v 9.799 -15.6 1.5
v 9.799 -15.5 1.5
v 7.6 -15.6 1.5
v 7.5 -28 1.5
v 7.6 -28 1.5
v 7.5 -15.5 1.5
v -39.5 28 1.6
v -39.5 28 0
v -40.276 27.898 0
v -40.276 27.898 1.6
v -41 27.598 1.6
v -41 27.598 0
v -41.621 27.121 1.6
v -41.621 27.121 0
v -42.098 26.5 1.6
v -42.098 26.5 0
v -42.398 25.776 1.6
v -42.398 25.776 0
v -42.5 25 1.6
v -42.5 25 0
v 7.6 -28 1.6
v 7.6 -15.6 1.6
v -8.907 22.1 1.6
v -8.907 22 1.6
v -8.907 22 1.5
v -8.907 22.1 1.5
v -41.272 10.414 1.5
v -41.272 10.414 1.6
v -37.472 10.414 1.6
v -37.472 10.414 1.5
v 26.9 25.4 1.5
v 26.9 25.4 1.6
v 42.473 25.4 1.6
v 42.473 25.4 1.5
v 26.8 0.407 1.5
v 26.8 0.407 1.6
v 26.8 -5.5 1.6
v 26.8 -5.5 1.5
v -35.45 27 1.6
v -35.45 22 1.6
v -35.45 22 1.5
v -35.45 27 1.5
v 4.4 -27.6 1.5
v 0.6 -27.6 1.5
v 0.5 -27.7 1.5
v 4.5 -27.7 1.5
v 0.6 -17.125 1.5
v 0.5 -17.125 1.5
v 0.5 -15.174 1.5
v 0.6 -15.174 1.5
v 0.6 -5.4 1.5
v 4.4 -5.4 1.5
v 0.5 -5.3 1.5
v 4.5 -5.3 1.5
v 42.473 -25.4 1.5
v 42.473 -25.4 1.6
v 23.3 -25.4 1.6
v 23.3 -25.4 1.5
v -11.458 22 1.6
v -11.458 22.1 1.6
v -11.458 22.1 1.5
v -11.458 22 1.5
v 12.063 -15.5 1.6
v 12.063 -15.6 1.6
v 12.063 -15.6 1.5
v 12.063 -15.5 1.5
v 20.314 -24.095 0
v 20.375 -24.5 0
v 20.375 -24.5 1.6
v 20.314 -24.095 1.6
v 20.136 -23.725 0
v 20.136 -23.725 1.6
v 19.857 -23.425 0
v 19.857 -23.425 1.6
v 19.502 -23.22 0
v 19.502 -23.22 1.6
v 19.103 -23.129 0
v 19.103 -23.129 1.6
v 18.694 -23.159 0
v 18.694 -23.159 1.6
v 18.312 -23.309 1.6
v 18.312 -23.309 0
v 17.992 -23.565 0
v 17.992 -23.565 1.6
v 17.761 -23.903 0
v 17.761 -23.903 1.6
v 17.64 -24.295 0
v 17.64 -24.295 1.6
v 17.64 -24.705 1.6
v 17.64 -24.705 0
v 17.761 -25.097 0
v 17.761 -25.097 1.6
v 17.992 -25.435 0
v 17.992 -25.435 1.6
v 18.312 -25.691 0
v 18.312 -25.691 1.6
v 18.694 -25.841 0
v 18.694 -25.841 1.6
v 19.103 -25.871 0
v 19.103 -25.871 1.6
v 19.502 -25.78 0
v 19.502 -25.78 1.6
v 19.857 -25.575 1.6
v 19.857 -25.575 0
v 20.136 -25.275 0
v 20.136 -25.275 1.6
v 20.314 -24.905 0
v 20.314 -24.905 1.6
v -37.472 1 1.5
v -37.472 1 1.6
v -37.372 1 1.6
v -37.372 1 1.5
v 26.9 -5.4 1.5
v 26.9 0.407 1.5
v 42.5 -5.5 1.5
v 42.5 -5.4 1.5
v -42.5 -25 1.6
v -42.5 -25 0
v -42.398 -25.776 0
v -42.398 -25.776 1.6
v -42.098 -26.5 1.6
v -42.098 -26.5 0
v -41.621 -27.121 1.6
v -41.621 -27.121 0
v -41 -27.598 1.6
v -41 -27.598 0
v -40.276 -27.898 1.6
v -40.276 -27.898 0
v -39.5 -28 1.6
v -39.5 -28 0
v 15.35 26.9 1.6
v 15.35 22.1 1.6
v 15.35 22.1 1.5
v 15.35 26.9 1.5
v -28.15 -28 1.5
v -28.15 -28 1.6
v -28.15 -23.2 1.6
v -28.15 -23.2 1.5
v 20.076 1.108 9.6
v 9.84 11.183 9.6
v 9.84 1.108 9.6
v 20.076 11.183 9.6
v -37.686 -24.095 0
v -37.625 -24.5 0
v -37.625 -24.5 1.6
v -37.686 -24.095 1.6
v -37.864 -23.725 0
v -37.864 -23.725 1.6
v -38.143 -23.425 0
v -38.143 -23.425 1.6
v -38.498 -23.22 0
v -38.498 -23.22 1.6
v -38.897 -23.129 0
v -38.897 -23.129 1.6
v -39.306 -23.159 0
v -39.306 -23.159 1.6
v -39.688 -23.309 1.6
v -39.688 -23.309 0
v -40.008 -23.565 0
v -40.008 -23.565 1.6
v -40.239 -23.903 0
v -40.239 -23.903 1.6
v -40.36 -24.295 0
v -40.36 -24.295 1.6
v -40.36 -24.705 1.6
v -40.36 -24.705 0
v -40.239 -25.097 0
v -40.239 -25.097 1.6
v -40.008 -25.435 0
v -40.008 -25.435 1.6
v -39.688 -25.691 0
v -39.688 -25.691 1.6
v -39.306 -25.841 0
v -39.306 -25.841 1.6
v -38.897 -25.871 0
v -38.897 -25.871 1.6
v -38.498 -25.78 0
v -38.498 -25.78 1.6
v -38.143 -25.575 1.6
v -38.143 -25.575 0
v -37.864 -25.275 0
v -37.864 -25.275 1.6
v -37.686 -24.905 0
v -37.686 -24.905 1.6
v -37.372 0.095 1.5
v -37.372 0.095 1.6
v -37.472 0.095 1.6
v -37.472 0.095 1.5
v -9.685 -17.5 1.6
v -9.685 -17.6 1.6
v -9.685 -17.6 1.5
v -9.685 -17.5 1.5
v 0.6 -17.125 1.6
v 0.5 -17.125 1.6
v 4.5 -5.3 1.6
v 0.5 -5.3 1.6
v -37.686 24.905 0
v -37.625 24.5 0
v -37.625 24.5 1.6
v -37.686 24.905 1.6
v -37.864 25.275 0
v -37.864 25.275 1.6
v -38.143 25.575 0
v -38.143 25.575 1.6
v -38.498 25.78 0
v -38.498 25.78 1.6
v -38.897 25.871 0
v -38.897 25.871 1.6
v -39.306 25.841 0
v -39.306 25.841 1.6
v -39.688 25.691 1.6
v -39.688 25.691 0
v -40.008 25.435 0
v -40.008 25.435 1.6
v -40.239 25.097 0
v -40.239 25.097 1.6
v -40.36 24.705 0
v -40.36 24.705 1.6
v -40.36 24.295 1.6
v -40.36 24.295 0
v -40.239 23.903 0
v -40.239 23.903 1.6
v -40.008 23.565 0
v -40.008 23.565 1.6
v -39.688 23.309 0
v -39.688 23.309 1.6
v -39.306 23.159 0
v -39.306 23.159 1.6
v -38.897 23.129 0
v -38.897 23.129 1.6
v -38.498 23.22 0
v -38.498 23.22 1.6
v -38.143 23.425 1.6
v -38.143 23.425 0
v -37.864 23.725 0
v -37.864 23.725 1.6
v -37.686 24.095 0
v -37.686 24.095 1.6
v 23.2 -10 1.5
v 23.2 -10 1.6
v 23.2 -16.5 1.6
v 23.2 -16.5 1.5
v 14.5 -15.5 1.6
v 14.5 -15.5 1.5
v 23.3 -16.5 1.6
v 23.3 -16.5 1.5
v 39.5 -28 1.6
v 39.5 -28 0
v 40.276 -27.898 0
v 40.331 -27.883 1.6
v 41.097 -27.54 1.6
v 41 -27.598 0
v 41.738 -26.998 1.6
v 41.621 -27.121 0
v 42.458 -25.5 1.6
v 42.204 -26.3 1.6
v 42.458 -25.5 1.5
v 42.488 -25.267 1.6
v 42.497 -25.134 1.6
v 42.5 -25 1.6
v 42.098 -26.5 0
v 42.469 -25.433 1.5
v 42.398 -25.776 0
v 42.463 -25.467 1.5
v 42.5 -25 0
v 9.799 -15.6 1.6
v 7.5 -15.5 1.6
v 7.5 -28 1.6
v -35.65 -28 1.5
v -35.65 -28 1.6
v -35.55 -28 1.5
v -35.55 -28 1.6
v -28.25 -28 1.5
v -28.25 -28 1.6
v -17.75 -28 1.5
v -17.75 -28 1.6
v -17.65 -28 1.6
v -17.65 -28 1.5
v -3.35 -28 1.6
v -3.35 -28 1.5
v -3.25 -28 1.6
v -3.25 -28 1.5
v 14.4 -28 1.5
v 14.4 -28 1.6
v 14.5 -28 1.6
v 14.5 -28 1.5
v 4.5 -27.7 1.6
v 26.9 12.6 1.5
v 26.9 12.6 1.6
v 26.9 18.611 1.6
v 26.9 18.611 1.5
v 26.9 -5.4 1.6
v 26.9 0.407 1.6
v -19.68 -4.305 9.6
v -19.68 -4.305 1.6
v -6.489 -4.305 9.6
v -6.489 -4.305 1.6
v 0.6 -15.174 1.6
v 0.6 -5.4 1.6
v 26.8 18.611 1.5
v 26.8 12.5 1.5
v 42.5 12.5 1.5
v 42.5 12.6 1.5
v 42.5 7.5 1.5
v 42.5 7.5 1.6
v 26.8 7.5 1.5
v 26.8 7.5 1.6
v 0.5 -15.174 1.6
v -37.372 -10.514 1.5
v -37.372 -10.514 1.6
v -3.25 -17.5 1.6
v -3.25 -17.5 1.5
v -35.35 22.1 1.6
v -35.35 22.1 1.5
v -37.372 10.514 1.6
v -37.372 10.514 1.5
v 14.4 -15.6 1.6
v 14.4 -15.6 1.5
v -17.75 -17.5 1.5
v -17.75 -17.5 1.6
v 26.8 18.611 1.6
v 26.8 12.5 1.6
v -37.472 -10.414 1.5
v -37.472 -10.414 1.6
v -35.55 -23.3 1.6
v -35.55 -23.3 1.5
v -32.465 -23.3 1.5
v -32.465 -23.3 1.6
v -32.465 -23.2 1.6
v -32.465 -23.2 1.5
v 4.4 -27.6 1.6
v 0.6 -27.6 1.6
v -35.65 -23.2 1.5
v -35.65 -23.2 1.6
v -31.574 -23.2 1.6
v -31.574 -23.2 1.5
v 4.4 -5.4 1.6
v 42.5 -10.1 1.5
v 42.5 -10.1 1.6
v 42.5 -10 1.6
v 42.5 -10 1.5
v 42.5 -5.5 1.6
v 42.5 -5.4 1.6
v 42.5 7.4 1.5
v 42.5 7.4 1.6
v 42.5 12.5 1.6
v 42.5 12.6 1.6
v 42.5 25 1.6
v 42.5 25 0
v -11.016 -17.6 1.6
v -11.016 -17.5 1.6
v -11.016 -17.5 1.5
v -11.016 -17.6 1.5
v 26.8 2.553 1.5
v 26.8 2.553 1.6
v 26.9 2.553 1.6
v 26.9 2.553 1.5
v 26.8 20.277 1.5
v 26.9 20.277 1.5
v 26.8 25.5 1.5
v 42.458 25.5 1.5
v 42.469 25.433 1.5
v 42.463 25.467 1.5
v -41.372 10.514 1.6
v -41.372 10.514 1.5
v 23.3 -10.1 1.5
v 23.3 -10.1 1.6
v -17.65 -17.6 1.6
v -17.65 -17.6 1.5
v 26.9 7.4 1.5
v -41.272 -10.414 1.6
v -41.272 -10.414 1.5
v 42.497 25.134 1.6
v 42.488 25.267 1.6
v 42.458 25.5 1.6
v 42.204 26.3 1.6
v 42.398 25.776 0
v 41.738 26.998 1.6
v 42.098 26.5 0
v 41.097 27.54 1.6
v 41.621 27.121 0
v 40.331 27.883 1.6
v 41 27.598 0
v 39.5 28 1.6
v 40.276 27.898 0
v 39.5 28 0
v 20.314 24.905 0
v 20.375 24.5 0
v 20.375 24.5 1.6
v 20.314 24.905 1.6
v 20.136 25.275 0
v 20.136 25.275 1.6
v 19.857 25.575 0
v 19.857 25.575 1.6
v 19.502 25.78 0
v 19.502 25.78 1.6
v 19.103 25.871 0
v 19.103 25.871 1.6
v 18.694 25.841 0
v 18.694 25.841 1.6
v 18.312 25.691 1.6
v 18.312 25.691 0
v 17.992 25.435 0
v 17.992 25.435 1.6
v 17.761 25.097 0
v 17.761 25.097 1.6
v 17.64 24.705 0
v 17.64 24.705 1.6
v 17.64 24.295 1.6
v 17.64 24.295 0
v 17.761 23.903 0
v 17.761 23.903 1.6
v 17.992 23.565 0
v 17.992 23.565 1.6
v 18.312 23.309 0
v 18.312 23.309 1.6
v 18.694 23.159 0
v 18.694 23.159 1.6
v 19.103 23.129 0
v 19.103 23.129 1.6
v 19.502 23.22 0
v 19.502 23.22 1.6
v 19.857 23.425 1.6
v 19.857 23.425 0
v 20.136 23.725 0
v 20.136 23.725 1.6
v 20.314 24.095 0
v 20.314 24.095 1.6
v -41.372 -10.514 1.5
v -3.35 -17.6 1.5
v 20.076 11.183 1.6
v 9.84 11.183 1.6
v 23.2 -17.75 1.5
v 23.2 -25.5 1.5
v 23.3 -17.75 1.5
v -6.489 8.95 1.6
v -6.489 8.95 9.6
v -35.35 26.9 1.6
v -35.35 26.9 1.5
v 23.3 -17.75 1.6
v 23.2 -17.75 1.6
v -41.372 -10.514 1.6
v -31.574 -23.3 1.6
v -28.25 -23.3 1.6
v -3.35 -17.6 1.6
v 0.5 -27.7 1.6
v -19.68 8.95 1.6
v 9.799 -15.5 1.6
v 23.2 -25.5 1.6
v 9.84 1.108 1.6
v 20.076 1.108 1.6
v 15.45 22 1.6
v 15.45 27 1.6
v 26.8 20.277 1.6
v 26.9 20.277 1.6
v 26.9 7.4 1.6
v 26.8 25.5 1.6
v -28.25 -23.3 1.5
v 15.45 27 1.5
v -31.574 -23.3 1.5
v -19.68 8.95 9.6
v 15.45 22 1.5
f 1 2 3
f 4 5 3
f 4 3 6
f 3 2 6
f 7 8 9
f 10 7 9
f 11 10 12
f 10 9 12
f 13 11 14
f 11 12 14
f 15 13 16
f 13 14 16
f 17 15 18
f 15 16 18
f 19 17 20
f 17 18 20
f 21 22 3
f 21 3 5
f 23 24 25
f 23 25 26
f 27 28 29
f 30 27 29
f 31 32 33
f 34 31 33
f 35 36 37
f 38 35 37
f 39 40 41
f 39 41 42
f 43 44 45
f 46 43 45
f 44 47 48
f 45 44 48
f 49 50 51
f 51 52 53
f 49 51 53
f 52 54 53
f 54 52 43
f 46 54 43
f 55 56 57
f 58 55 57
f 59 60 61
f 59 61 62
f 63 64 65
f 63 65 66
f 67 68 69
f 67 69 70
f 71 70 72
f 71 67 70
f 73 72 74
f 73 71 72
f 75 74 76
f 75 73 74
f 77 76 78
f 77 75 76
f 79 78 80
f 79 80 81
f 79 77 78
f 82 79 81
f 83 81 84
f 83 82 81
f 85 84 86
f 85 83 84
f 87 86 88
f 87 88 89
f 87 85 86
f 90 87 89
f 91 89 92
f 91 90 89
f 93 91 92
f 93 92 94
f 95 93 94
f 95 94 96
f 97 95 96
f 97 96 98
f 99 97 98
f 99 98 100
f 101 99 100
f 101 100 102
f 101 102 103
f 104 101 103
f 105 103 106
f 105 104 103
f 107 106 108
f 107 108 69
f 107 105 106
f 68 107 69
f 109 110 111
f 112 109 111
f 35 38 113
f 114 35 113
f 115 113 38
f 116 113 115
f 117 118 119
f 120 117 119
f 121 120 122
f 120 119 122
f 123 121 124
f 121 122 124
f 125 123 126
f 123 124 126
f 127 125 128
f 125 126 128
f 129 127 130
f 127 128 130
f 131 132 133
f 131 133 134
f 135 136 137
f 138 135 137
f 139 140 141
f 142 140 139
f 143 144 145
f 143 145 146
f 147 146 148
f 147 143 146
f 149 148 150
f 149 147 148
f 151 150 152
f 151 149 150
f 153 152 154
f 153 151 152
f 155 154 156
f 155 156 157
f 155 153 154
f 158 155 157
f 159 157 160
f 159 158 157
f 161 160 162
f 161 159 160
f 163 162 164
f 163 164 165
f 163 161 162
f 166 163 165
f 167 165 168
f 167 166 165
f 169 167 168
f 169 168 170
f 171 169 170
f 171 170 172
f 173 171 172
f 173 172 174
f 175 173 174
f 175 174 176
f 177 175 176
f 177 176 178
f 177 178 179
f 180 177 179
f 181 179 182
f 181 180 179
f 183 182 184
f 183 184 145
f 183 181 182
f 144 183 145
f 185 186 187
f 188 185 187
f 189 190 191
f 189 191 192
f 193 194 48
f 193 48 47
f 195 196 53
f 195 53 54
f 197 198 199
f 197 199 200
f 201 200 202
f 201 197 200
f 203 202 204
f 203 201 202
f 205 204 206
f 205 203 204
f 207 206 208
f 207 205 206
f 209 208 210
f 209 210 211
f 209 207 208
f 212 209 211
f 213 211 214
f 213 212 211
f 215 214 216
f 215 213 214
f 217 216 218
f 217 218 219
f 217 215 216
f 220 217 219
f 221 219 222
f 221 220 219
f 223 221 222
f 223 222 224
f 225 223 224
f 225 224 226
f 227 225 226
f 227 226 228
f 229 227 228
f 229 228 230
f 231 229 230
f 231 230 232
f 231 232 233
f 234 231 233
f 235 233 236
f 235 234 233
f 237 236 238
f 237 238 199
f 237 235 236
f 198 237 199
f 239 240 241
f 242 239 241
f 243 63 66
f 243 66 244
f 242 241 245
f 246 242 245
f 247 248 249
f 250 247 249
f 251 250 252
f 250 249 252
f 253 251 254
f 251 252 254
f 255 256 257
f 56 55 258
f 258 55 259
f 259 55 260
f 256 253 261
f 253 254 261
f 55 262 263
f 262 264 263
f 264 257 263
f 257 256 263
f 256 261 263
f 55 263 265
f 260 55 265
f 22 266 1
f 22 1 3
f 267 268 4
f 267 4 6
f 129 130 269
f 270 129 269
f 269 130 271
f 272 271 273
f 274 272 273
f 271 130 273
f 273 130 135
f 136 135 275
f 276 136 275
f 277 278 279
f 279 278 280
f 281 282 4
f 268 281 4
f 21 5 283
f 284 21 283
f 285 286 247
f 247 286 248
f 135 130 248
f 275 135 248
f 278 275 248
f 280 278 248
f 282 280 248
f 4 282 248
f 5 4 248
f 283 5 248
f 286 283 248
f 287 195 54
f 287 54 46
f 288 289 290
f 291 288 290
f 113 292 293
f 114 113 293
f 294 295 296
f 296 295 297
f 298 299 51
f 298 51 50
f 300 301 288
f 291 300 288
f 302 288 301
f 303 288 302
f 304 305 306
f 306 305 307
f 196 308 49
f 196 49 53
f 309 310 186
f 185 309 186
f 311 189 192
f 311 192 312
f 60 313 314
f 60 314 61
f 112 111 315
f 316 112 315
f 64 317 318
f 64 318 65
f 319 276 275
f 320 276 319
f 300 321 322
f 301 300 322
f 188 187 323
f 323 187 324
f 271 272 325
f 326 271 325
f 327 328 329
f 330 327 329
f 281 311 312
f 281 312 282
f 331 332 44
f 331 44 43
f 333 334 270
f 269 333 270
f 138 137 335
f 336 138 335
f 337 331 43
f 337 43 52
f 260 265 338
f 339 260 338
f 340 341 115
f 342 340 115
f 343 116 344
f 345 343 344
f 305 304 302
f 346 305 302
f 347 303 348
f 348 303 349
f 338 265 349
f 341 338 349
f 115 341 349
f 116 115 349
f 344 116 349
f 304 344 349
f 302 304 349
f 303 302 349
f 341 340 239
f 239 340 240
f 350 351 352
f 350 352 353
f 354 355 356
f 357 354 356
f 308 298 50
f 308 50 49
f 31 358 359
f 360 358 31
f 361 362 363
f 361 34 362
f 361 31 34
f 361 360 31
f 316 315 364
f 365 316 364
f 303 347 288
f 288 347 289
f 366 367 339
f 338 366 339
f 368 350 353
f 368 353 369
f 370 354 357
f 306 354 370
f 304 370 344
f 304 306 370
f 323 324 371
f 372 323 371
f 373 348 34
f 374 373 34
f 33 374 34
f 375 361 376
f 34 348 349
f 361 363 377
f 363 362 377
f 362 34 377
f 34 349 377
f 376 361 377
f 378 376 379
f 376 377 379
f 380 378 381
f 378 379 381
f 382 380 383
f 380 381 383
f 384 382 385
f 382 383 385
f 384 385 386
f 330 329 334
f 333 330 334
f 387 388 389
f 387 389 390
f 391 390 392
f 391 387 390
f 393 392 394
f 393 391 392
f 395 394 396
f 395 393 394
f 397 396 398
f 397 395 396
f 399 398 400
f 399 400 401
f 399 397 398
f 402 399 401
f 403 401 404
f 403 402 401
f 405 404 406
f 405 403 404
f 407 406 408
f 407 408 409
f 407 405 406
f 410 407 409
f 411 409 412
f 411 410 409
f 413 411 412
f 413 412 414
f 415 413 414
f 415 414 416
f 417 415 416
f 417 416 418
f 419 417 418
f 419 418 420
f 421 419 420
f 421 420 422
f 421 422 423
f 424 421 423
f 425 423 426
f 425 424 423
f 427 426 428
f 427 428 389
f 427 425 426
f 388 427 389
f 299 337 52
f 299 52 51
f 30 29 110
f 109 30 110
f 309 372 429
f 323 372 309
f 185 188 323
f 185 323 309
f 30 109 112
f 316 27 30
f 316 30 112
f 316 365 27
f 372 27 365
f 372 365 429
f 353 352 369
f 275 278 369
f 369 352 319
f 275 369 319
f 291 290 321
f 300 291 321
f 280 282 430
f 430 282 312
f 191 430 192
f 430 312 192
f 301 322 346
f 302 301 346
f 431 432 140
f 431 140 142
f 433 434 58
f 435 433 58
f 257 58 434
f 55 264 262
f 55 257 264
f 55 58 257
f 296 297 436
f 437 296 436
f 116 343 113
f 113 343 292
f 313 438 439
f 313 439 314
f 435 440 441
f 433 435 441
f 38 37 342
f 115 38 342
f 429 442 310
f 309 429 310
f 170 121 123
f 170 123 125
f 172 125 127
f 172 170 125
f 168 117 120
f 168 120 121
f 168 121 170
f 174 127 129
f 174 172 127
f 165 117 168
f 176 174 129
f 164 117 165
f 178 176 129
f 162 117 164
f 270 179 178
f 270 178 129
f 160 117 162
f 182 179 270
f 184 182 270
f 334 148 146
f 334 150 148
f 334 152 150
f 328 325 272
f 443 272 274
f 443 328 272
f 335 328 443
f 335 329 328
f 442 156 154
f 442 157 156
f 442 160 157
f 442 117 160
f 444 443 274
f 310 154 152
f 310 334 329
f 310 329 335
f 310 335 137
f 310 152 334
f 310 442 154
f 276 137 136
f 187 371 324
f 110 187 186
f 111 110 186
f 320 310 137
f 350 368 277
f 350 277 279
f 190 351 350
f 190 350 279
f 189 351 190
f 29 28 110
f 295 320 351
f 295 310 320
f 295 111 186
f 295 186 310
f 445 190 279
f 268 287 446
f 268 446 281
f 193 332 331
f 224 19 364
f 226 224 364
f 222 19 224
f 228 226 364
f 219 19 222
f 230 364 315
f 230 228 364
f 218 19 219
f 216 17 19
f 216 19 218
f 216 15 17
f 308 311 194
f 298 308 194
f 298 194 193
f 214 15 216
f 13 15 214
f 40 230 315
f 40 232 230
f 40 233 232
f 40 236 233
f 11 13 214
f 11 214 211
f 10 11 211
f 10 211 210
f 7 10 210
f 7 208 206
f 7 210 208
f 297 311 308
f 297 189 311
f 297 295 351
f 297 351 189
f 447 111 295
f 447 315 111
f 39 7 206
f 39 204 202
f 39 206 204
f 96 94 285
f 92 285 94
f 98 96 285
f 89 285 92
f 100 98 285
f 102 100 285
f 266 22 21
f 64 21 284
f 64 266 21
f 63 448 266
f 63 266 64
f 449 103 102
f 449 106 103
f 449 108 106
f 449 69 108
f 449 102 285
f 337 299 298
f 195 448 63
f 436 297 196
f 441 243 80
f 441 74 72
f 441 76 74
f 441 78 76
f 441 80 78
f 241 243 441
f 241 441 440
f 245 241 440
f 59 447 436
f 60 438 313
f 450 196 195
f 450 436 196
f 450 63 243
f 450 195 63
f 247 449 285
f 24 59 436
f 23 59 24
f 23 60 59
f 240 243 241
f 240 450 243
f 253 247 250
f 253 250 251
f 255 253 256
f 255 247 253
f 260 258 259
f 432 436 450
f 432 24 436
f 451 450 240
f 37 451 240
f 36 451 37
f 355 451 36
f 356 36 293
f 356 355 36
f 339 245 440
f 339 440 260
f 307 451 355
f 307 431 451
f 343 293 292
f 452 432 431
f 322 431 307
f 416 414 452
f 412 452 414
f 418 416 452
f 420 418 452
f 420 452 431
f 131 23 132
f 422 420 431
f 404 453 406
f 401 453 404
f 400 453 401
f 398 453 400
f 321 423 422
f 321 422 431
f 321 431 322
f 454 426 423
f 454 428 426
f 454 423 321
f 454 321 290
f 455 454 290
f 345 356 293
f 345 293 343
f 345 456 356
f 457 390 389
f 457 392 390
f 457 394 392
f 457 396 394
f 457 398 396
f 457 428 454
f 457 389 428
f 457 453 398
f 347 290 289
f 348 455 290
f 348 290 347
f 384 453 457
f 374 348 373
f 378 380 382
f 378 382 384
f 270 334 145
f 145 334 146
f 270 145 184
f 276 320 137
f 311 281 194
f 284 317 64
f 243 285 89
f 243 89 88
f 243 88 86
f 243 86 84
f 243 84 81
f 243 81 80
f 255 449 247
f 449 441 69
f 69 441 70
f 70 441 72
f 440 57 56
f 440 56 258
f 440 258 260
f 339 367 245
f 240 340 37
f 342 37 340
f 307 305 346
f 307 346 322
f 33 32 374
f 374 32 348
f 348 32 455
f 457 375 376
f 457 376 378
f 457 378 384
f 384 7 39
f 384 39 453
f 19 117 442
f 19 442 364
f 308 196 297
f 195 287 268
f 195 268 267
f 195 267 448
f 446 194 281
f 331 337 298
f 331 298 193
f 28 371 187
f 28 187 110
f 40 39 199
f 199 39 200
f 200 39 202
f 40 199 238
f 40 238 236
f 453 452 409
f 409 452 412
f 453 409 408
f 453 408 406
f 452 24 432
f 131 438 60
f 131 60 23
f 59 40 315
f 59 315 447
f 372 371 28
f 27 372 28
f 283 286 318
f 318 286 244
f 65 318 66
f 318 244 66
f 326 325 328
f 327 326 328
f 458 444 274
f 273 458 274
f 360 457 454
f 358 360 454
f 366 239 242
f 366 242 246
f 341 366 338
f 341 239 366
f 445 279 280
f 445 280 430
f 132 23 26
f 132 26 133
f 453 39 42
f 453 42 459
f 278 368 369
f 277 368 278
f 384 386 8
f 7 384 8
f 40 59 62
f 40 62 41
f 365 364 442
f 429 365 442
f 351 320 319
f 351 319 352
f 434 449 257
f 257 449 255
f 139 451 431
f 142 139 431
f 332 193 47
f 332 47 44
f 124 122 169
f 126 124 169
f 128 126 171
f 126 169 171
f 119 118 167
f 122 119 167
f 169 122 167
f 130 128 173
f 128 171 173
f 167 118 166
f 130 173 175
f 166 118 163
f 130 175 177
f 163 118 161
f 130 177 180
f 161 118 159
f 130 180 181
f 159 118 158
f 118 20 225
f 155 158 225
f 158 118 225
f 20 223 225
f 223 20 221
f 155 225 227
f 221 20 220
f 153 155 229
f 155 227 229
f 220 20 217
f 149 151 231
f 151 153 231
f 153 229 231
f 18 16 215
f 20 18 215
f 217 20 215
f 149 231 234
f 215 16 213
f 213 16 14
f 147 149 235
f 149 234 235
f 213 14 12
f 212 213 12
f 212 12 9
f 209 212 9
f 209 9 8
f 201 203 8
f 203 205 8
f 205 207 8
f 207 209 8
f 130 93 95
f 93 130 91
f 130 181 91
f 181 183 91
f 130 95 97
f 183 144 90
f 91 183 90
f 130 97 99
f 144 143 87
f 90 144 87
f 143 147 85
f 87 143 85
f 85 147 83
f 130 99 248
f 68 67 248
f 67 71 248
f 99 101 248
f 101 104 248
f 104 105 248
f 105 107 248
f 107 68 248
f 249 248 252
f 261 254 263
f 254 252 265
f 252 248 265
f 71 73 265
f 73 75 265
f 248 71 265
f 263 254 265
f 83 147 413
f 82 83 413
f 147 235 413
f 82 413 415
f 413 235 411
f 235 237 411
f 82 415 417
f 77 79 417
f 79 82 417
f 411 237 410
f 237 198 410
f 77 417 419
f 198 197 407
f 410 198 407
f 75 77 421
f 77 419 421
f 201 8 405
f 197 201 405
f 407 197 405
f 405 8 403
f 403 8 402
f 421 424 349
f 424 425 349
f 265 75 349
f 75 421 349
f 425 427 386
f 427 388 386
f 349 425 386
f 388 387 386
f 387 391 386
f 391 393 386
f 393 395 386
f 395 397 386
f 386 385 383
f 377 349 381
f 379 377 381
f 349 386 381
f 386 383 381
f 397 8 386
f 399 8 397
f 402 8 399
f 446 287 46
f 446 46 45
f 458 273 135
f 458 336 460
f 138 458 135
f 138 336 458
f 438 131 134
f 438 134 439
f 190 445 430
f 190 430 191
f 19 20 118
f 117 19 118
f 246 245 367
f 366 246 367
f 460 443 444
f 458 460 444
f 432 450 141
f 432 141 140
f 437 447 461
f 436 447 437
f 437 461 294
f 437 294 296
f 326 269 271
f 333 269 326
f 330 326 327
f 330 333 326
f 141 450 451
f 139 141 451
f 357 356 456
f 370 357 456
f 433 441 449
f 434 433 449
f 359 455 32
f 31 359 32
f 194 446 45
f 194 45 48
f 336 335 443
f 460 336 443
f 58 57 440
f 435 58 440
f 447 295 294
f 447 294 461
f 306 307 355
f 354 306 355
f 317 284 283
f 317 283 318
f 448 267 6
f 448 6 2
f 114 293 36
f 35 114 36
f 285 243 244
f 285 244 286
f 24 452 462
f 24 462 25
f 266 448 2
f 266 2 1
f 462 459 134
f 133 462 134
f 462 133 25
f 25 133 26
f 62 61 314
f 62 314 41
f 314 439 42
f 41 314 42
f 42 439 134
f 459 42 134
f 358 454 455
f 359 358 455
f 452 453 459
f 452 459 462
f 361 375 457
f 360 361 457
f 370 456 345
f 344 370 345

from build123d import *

# Parameters (mm, degrees)
SKETCH1_R           = 1.375
BOSS_EXTRUDE1_DEPTH = 1.6
CUT_EXTRUDE1_DEPTH  = 0.1
SKETCH_1_W          = 13.191380008
SKETCH_1_H          = 13.254567414
EXTRUDE_1_DEPTH     = 8
SKETCH_2_W          = 10.236154205
SKETCH_2_H          = 10.074954926
EXTRUDE_2_DEPTH     = 8


with BuildPart() as part:
    # Sketch1 → Boss-Extrude1 (new body)
    with BuildSketch(Plane.XY):
        with BuildLine():
            Line((-39.5, -28), (39.5, -28))
            ThreePointArc((39.5, -28), (41.621320344, -27.121320344), (42.5, -25))
            Line((42.5, -25), (42.5, 25))
            ThreePointArc((42.5, 25), (41.621320344, 27.121320344), (39.5, 28))
            Line((39.5, 28), (-39.5, 28))
            ThreePointArc((-39.5, 28), (-41.621320344, 27.121320344), (-42.5, 25))
            Line((-42.5, 25), (-42.5, -25))
            ThreePointArc((-42.5, -25), (-41.621320344, -27.121320344), (-39.5, -28))
        make_face()
        with Locations((-39, 24.5)):
            Circle(SKETCH1_R, mode=Mode.SUBTRACT)
        with Locations((-39, -24.5)):
            Circle(SKETCH1_R, mode=Mode.SUBTRACT)
        with Locations((19, 24.5)):
            Circle(SKETCH1_R, mode=Mode.SUBTRACT)
        with Locations((19, -24.5)):
            Circle(SKETCH1_R, mode=Mode.SUBTRACT)
    extrude(amount=BOSS_EXTRUDE1_DEPTH)

    # Sketch2 → Cut-Extrude1 (cut)
    with BuildSketch(Plane.XY.offset(1.6)):
        Polygon((-35.65, -28.636850855), (-28.15, -28.636850855), (-28.15, -23.2), (-31.573707352, -23.2), (-31.573707352, -23.3), (-28.25, -23.3), (-28.25, -28.536850855), (-35.55, -28.536850855), (-35.55, -23.3), (-32.465045999, -23.3), (-32.465045999, -23.2), (-35.65, -23.2), align=None)
        Polygon((-17.75, -17.5), (-11.015830732, -17.5), (-11.015830732, -17.6), (-17.65, -17.6), (-17.65, -33.061376344), (-3.35, -33.061376344), (-3.35, -17.6), (-9.684859924, -17.6), (-9.684859924, -17.5), (-3.25, -17.5), (-3.25, -33.161376344), (-17.75, -33.161376344), align=None)
        Polygon((0.5, -5.3), (4.5, -5.3), (4.5, -27.7), (0.5, -27.7), (0.5, -17.125), (0.6, -17.125), (0.6, -27.6), (4.4, -27.6), (4.4, -5.4), (0.6, -5.4), (0.6, -15.17398131), (0.5, -15.17398131), align=None)
        Polygon((7.5, -15.5), (9.799158316, -15.5), (9.799158316, -15.6), (7.6, -15.6), (7.6, -31.061376344), (14.4, -31.061376344), (14.4, -15.6), (12.062610562, -15.6), (12.062610562, -15.5), (14.5, -15.5), (14.5, -31.161376344), (7.5, -31.161376344), align=None)
        Polygon((-35.45, 27), (15.45, 27), (15.45, 22), (-8.906687942, 22), (-8.906687942, 22.1), (15.35, 22.1), (15.35, 26.9), (-35.35, 26.9), (-35.35, 22.1), (-11.458179647, 22.1), (-11.458179647, 22), (-35.45, 22), align=None)
        Polygon((-41.371710411, -10.514157593), (-37.371710411, -10.514157593), (-37.371710411, 0.094714316), (-37.471710411, 0.094714316), (-37.471710411, -10.414157593), (-41.271710411, -10.414157593), (-41.271710411, 10.414157593), (-37.471710411, 10.414157593), (-37.471710411, 1), (-37.371710411, 1), (-37.371710411, 10.514157593), (-41.371710411, 10.514157593), align=None)
        Polygon((23.2, -25.5), (44.7, -25.5), (44.7, -10), (23.2, -10), (23.2, -16.5), (23.3, -16.5), (23.3, -10.1), (44.6, -10.1), (44.6, -25.4), (23.3, -25.4), (23.3, -17.75), (23.2, -17.75), align=None)
        Polygon((26.8, -5.5), (54.071370237, -5.5), (54.071370237, 7.5), (26.8, 7.5), (26.8, 2.552788505), (26.9, 2.552788505), (26.9, 7.4), (53.971370237, 7.4), (53.971370237, -5.4), (26.9, -5.4), (26.9, 0.407211154), (26.8, 0.407211154), align=None)
        Polygon((26.8, 12.5), (57.71374017, 12.5), (57.71374017, 25.5), (26.8, 25.5), (26.8, 20.277341759), (26.9, 20.277341759), (26.9, 25.4), (57.61374017, 25.4), (57.61374017, 12.6), (26.9, 12.6), (26.9, 18.611308355), (26.8, 18.611308355), align=None)
    extrude(amount=-CUT_EXTRUDE1_DEPTH, mode=Mode.SUBTRACT)

    # Эскиз1 → Бобышка-Вытянуть1 (add)
    with BuildSketch(Plane.XY.offset(1.6)):
        with Locations((-13.084710258, 2.32266466)):
            Rectangle(SKETCH_1_W, SKETCH_1_H)
    extrude(amount=EXTRUDE_1_DEPTH)

    # Эскиз2 → Бобышка-Вытянуть2 (add)
    with BuildSketch(Plane.XY.offset(1.6)):
        with Locations((14.958106781, 6.145819854)):
            Rectangle(SKETCH_2_W, SKETCH_2_H)
    extrude(amount=EXTRUDE_2_DEPTH)


solid = part.part
